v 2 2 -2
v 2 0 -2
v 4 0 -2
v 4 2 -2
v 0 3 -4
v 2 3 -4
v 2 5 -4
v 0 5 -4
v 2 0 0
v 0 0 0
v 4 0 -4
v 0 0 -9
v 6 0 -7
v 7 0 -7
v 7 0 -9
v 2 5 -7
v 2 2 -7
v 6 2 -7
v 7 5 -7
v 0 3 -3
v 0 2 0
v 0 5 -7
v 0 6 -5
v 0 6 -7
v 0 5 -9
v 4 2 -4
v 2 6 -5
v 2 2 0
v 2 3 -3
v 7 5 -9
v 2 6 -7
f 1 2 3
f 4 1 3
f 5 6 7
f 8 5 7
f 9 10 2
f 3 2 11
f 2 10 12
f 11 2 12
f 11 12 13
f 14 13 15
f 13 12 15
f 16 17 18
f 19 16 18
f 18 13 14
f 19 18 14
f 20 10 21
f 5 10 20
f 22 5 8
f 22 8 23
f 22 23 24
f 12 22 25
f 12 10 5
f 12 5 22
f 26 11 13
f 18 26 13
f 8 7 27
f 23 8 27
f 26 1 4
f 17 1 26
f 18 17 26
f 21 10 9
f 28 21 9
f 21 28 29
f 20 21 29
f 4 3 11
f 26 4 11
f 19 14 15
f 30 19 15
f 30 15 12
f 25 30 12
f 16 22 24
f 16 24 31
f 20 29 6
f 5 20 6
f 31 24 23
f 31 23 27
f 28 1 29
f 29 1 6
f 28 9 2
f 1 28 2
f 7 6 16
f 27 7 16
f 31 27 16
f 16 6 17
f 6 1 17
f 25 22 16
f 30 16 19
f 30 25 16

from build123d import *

# Parameters (mm, degrees)
BOSS_EXTRUDE1_DEPTH = 2
BOSS_EXTRUDE2_DEPTH = 3
SKETCH3_W           = 2
SKETCH3_H           = 3
BOSS_EXTRUDE3_DEPTH = 1
CUT_EXTRUDE1_DEPTH  = 3


with BuildPart() as part:
    # Sketch1 → Boss-Extrude1 (new body)
    with BuildSketch(Plane(origin=(0, 0, 0), x_dir=(1, 0, 0), z_dir=(0, 1, 0))):
        Polygon((0, 0), (2, 0), (2, 2), (4, 2), (4, 4), (6, 7), (7, 7), (7, 9), (0, 9), align=None)
    extrude(amount=BOSS_EXTRUDE1_DEPTH)

    # Sketch2 → Boss-Extrude2 (add)
    with BuildSketch(Plane(origin=(0, 2, 0), x_dir=(1, 0, 0), z_dir=(0, 1, 0))):
        Polygon((7, 9), (0, 9), (0, 0), (2, 0), (2, 7), (7, 7), align=None)
    extrude(amount=BOSS_EXTRUDE2_DEPTH)

    # Sketch3 → Boss-Extrude3 (add)
    with BuildSketch(Plane(origin=(0, 5, 0), x_dir=(1, 0, 0), z_dir=(0, 1, 0))):
        with Locations((1, 5.5)):
            Rectangle(SKETCH3_W, SKETCH3_H)
    extrude(amount=BOSS_EXTRUDE3_DEPTH)

    # Sketch4 → Cut-Extrude1 (cut, through all)
    with BuildSketch(Plane(origin=(2, 0, 0), x_dir=(0, 0, -1), z_dir=(1, 0, 0))):
        Polygon((4, 5), (5, 6), (4, 6), align=None)
        Polygon((4, 3), (4, 5), (0, 5), (0, 2), (3, 3), align=None)
    extrude(amount=-CUT_EXTRUDE1_DEPTH, mode=Mode.SUBTRACT)


solid = part.part
